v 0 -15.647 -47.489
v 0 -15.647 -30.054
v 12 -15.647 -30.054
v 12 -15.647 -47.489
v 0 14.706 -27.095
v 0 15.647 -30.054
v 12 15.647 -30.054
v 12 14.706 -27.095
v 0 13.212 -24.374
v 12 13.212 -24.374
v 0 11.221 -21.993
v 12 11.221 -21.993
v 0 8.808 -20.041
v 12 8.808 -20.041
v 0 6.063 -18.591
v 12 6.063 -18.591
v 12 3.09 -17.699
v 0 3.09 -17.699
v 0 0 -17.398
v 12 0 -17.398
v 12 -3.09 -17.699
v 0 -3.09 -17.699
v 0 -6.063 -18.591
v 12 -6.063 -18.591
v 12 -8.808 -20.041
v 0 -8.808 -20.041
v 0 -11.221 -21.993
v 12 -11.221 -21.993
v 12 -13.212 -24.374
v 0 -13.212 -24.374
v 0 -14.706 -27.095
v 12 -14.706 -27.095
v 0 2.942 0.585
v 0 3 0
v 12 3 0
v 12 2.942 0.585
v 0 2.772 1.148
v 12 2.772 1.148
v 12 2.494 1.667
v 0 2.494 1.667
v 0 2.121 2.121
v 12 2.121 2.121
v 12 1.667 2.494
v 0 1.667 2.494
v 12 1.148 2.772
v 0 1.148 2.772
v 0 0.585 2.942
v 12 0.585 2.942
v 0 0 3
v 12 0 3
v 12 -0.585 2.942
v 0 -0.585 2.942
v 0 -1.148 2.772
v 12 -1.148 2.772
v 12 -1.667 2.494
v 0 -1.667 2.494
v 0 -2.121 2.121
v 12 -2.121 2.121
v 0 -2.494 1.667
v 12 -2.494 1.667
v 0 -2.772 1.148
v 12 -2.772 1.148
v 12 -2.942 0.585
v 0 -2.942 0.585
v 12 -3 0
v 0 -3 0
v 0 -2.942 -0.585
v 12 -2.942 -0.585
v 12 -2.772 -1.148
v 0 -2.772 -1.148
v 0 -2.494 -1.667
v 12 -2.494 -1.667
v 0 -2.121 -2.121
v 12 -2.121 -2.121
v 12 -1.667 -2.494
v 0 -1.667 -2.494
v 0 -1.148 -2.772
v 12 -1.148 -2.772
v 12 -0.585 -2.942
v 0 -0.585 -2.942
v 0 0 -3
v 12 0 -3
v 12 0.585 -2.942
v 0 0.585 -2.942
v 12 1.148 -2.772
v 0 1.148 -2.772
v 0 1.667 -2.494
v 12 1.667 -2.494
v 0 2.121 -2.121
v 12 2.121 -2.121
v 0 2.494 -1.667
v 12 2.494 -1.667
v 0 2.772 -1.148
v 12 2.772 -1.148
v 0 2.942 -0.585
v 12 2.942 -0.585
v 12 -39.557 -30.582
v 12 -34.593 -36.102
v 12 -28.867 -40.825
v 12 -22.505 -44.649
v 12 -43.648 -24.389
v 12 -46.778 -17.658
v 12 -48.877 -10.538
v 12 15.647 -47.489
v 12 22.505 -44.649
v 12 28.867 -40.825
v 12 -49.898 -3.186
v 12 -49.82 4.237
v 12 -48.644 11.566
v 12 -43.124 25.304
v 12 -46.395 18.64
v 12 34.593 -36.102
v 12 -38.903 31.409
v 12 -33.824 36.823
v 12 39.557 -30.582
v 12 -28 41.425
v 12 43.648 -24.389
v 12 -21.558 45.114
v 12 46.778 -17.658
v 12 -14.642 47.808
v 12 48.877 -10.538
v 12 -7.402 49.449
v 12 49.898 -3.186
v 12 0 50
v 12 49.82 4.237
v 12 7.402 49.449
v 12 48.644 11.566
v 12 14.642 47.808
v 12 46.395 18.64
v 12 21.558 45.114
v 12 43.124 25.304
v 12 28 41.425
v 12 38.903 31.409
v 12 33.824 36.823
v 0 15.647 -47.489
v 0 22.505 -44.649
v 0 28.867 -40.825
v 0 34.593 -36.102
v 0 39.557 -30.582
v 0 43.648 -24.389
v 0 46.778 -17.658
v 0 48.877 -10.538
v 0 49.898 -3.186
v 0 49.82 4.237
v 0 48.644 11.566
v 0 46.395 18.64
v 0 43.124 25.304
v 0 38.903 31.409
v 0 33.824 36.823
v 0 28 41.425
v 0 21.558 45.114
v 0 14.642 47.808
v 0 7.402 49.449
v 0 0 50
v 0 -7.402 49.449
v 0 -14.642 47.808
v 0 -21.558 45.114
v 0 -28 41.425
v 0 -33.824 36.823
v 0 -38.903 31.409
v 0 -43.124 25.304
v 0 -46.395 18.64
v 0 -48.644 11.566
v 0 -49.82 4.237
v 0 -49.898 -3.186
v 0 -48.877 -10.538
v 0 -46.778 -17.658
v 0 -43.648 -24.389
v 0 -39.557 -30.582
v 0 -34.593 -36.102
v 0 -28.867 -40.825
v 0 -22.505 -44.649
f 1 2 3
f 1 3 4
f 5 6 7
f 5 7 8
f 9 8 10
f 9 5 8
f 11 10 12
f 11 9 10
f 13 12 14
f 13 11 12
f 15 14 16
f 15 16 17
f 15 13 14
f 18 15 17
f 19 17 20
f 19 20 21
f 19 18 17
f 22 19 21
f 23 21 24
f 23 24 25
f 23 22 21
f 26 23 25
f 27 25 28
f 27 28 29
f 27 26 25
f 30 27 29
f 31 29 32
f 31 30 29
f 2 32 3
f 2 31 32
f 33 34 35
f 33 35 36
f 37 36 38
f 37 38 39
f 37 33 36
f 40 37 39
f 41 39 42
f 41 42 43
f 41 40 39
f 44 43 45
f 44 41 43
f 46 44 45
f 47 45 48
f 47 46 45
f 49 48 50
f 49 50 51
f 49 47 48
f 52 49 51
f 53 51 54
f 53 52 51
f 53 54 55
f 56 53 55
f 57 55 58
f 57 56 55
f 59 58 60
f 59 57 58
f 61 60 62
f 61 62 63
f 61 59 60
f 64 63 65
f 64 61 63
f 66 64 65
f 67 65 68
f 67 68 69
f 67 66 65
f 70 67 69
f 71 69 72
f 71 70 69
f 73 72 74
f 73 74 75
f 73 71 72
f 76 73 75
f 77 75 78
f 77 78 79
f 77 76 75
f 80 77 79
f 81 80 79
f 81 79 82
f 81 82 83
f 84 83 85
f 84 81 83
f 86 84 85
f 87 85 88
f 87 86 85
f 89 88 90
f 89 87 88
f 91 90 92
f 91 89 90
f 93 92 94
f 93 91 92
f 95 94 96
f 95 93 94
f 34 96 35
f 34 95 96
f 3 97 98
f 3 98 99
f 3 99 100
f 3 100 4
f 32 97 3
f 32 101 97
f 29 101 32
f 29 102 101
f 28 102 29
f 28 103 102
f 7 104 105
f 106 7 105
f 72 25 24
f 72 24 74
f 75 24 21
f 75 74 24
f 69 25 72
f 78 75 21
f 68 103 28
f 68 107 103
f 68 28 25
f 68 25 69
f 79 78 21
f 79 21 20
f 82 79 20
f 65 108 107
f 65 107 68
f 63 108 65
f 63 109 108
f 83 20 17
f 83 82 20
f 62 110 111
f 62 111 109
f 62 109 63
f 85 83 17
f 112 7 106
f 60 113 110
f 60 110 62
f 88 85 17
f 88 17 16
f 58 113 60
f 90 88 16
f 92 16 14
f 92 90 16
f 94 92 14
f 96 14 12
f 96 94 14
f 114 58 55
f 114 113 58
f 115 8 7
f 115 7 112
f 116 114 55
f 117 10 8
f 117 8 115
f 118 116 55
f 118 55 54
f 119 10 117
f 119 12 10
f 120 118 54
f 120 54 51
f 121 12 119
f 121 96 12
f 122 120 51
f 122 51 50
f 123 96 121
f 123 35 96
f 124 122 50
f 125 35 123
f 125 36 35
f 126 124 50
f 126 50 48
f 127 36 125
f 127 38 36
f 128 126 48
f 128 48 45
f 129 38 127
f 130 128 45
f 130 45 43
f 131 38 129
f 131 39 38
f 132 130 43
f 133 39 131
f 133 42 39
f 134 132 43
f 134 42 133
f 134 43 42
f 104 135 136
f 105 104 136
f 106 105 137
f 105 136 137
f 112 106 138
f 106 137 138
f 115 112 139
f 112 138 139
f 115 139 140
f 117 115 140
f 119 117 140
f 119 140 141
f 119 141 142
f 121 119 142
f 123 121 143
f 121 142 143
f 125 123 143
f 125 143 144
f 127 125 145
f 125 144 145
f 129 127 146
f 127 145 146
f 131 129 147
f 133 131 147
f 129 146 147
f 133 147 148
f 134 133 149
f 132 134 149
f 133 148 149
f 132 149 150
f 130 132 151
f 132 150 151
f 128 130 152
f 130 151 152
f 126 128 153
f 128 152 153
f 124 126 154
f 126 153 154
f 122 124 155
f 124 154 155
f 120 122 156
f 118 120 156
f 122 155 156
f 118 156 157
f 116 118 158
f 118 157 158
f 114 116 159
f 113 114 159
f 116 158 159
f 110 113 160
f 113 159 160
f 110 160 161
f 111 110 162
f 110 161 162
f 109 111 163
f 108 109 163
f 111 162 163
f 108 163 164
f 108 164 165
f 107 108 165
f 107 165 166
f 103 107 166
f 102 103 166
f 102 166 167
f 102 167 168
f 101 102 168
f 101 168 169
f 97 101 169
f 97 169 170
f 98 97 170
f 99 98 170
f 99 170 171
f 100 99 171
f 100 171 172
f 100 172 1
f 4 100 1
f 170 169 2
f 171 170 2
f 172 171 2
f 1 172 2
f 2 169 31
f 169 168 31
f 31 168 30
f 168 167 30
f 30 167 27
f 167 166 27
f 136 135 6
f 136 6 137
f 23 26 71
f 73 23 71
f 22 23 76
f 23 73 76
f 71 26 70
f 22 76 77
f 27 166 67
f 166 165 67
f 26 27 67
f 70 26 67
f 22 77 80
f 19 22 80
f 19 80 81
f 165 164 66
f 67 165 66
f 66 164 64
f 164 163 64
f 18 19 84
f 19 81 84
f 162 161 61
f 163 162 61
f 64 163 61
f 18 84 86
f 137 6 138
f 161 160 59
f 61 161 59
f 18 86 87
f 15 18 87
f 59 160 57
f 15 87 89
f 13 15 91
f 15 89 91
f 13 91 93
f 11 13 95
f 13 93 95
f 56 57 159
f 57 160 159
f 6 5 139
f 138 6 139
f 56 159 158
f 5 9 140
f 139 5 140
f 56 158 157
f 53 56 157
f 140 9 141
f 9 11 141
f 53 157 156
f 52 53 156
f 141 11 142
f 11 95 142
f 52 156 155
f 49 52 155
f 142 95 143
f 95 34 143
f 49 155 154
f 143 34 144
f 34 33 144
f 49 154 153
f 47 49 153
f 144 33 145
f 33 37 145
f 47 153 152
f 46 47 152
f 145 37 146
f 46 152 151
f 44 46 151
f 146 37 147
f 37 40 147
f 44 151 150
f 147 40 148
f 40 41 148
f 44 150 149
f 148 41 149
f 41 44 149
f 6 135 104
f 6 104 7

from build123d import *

# Parameters (mm, degrees)
SKETCH_R  = 3
PAD_DEPTH = 12


with BuildPart() as part:
    # Sketch → Pad (new body)
    with BuildSketch(Plane.YZ):
        with BuildLine():
            ThreePointArc((15.646539, -47.488797), (0, 50), (-15.646539, -47.488797))
            Line((-15.646539, -30.053604), (-15.646539, -47.488797))
            ThreePointArc((15.646539, -30.053604), (0, -17.398124), (-15.646539, -30.053604))
            Line((15.646539, -47.488797), (15.646539, -30.053604))
        make_face()
        Circle(SKETCH_R, mode=Mode.SUBTRACT)
    extrude(amount=PAD_DEPTH)


solid = part.part
